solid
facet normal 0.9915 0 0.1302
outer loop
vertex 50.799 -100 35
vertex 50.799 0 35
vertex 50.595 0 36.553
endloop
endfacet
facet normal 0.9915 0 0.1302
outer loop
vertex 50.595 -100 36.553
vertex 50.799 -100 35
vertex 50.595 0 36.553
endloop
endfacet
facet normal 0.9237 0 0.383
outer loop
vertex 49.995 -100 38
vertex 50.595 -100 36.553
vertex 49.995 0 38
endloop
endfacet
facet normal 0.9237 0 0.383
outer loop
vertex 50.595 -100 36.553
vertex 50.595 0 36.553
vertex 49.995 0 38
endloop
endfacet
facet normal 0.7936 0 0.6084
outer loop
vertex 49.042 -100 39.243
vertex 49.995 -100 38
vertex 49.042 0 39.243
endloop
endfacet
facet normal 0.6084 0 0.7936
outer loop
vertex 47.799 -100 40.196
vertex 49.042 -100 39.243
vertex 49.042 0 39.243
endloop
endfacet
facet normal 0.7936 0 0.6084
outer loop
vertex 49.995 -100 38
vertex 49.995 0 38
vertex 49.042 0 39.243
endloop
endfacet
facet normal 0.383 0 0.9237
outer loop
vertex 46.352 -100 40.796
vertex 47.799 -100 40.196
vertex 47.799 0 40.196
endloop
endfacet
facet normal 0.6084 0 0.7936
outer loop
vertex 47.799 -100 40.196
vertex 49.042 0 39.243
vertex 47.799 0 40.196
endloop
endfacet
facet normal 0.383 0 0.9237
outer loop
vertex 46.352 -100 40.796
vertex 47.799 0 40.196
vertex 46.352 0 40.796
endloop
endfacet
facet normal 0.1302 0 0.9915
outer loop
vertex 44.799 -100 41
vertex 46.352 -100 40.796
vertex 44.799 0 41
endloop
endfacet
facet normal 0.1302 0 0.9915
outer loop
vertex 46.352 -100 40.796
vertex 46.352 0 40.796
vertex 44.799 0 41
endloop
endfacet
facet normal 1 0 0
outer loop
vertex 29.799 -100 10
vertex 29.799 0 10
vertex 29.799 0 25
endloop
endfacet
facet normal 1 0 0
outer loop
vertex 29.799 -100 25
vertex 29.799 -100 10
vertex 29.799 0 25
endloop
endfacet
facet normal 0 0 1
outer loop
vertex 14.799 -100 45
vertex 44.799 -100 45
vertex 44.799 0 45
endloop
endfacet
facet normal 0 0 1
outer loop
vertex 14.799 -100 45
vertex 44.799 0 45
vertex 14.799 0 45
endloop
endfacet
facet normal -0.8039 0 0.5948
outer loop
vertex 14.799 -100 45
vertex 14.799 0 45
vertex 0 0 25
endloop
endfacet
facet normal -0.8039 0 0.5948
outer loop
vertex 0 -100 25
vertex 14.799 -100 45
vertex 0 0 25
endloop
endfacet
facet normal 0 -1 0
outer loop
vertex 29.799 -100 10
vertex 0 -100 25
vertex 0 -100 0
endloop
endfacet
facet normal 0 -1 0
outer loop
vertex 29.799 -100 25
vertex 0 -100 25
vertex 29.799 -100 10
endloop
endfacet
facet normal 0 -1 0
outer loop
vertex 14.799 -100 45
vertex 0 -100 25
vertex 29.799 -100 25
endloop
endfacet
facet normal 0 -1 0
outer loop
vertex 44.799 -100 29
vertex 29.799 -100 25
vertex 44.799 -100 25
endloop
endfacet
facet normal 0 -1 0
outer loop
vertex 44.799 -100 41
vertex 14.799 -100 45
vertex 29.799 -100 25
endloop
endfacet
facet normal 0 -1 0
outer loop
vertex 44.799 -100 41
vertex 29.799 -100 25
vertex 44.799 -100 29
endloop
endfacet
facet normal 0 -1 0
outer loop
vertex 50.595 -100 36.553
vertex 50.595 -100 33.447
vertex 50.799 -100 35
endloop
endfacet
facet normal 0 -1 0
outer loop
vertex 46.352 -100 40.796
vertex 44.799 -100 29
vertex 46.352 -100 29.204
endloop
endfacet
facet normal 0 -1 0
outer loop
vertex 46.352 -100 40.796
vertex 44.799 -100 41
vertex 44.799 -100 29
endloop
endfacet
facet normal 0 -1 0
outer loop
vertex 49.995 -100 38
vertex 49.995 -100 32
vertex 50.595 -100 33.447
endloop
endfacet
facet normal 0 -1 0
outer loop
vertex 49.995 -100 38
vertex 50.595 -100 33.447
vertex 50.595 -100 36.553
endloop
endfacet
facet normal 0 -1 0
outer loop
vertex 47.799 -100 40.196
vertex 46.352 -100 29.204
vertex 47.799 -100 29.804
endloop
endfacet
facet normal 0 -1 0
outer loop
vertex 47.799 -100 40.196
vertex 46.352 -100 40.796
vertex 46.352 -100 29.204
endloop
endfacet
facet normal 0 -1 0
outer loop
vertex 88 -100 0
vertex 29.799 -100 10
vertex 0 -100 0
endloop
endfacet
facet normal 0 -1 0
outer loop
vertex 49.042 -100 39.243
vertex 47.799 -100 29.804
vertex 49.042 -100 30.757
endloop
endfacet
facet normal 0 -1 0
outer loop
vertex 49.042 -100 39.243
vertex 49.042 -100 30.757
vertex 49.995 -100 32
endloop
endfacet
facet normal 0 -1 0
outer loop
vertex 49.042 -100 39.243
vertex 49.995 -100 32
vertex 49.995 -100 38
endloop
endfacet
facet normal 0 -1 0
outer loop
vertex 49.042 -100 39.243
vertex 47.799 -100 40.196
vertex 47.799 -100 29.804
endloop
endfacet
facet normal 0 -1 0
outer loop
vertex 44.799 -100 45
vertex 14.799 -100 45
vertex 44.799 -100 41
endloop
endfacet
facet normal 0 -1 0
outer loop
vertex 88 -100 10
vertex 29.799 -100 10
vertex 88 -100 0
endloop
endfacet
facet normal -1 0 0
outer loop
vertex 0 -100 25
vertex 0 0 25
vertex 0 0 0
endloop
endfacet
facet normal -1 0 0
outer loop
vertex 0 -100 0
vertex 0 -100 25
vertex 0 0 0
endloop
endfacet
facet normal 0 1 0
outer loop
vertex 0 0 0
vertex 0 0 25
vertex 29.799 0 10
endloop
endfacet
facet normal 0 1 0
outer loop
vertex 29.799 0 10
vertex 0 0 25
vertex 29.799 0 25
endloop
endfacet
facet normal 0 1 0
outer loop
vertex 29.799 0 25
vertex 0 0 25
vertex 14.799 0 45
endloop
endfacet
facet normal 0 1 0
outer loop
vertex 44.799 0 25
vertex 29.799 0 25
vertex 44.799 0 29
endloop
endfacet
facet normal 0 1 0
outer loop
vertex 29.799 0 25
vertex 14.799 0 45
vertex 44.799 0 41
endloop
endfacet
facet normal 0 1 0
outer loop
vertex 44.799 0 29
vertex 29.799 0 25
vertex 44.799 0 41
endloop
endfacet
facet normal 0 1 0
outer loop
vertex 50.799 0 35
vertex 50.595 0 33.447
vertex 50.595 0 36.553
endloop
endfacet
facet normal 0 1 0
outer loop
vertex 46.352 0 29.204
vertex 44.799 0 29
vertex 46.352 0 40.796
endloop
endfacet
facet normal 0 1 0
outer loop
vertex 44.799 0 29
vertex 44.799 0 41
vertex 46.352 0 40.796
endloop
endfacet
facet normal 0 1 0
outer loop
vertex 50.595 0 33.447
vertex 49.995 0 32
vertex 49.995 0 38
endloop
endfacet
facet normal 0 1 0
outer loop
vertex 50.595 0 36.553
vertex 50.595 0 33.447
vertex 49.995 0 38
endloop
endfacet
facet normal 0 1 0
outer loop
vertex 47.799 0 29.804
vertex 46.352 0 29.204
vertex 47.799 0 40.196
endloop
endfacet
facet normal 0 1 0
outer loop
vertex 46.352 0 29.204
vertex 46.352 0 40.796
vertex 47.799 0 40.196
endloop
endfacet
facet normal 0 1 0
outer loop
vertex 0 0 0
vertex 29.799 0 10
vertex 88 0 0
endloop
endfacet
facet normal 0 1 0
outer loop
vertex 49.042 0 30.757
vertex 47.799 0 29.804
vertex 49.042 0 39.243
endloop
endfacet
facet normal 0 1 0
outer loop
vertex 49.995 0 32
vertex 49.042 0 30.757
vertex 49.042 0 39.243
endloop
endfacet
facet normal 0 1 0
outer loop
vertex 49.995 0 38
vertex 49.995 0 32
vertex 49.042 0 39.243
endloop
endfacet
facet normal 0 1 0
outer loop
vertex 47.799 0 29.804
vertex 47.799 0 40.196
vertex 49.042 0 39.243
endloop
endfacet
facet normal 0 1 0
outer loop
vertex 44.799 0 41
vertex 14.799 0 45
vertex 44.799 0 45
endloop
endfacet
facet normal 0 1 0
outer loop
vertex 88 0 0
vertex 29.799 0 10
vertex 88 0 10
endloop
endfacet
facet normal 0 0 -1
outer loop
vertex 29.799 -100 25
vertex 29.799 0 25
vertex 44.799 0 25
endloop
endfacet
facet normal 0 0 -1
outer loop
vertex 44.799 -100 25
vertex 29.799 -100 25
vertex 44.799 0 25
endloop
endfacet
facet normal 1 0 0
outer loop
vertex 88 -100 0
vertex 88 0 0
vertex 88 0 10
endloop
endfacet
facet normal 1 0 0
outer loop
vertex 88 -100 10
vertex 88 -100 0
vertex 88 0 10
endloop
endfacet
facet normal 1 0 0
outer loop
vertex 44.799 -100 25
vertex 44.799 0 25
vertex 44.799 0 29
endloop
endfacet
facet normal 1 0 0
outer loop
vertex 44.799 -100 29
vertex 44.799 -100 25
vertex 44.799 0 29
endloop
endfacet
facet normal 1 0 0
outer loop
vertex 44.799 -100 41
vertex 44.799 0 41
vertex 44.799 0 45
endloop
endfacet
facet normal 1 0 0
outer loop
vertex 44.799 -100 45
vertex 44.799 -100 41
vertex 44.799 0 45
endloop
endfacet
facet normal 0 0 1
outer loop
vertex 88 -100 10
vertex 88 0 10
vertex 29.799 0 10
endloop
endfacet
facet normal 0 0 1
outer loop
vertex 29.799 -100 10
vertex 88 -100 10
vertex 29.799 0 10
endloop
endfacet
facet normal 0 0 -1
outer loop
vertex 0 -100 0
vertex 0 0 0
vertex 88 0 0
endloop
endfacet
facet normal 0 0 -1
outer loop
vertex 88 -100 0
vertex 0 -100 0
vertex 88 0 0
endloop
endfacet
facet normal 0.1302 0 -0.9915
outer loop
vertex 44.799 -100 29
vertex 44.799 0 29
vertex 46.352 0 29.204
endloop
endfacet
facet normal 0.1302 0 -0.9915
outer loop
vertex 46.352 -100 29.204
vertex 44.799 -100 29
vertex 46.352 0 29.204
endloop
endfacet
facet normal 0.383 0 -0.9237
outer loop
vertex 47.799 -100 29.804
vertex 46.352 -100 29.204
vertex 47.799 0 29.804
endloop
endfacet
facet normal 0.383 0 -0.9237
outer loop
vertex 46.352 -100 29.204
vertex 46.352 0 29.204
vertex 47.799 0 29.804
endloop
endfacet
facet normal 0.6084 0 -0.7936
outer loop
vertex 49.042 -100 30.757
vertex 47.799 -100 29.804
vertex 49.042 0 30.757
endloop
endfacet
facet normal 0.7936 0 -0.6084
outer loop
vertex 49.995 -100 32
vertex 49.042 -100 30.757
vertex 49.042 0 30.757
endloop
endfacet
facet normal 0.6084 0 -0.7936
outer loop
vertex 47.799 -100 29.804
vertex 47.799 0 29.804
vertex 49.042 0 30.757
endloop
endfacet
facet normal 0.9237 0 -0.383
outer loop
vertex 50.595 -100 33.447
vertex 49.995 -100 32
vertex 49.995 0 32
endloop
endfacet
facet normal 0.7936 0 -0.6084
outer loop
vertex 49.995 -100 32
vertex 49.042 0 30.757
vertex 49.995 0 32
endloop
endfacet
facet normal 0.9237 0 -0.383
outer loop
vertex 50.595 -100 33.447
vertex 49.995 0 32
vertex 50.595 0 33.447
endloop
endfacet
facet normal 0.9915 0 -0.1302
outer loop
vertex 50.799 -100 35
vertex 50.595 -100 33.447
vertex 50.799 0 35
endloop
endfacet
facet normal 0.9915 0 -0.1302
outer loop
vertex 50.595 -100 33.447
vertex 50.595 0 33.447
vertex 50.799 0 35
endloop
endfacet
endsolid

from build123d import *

# Parameters (mm, degrees)
F1_DEPTH = 100


with BuildPart() as f1:
    # F0 (on Front) → F1 (new body)
    with BuildSketch(Plane.XZ):
        with BuildLine():
            Line((0, 25), (0, 0))
            Line((0, 0), (88, 0))
            Line((88, 0), (88, 10))
            Line((88, 10), (29.799222, 10))
            Line((29.799222, 10), (29.799222, 25))
            Line((29.799222, 25), (44.799222, 25))
            Line((44.799222, 25), (44.799222, 29))
            ThreePointArc((44.799222, 29), (38.799222, 35), (44.799222, 41))
            Line((44.799222, 41), (44.799222, 45))
            Line((44.799222, 45), (14.799222, 45))
            Line((14.799222, 45), (0, 25))
        make_face()
        with BuildLine():
            ThreePointArc((50.799222, 35), (49.041862, 39.242641), (44.799222, 41))
            ThreePointArc((44.799222, 41), (38.799222, 35), (44.799222, 29))
            ThreePointArc((44.799222, 29), (49.041862, 30.757359), (50.799222, 35))
        make_face()
    extrude(amount=F1_DEPTH)


solid = f1.part
